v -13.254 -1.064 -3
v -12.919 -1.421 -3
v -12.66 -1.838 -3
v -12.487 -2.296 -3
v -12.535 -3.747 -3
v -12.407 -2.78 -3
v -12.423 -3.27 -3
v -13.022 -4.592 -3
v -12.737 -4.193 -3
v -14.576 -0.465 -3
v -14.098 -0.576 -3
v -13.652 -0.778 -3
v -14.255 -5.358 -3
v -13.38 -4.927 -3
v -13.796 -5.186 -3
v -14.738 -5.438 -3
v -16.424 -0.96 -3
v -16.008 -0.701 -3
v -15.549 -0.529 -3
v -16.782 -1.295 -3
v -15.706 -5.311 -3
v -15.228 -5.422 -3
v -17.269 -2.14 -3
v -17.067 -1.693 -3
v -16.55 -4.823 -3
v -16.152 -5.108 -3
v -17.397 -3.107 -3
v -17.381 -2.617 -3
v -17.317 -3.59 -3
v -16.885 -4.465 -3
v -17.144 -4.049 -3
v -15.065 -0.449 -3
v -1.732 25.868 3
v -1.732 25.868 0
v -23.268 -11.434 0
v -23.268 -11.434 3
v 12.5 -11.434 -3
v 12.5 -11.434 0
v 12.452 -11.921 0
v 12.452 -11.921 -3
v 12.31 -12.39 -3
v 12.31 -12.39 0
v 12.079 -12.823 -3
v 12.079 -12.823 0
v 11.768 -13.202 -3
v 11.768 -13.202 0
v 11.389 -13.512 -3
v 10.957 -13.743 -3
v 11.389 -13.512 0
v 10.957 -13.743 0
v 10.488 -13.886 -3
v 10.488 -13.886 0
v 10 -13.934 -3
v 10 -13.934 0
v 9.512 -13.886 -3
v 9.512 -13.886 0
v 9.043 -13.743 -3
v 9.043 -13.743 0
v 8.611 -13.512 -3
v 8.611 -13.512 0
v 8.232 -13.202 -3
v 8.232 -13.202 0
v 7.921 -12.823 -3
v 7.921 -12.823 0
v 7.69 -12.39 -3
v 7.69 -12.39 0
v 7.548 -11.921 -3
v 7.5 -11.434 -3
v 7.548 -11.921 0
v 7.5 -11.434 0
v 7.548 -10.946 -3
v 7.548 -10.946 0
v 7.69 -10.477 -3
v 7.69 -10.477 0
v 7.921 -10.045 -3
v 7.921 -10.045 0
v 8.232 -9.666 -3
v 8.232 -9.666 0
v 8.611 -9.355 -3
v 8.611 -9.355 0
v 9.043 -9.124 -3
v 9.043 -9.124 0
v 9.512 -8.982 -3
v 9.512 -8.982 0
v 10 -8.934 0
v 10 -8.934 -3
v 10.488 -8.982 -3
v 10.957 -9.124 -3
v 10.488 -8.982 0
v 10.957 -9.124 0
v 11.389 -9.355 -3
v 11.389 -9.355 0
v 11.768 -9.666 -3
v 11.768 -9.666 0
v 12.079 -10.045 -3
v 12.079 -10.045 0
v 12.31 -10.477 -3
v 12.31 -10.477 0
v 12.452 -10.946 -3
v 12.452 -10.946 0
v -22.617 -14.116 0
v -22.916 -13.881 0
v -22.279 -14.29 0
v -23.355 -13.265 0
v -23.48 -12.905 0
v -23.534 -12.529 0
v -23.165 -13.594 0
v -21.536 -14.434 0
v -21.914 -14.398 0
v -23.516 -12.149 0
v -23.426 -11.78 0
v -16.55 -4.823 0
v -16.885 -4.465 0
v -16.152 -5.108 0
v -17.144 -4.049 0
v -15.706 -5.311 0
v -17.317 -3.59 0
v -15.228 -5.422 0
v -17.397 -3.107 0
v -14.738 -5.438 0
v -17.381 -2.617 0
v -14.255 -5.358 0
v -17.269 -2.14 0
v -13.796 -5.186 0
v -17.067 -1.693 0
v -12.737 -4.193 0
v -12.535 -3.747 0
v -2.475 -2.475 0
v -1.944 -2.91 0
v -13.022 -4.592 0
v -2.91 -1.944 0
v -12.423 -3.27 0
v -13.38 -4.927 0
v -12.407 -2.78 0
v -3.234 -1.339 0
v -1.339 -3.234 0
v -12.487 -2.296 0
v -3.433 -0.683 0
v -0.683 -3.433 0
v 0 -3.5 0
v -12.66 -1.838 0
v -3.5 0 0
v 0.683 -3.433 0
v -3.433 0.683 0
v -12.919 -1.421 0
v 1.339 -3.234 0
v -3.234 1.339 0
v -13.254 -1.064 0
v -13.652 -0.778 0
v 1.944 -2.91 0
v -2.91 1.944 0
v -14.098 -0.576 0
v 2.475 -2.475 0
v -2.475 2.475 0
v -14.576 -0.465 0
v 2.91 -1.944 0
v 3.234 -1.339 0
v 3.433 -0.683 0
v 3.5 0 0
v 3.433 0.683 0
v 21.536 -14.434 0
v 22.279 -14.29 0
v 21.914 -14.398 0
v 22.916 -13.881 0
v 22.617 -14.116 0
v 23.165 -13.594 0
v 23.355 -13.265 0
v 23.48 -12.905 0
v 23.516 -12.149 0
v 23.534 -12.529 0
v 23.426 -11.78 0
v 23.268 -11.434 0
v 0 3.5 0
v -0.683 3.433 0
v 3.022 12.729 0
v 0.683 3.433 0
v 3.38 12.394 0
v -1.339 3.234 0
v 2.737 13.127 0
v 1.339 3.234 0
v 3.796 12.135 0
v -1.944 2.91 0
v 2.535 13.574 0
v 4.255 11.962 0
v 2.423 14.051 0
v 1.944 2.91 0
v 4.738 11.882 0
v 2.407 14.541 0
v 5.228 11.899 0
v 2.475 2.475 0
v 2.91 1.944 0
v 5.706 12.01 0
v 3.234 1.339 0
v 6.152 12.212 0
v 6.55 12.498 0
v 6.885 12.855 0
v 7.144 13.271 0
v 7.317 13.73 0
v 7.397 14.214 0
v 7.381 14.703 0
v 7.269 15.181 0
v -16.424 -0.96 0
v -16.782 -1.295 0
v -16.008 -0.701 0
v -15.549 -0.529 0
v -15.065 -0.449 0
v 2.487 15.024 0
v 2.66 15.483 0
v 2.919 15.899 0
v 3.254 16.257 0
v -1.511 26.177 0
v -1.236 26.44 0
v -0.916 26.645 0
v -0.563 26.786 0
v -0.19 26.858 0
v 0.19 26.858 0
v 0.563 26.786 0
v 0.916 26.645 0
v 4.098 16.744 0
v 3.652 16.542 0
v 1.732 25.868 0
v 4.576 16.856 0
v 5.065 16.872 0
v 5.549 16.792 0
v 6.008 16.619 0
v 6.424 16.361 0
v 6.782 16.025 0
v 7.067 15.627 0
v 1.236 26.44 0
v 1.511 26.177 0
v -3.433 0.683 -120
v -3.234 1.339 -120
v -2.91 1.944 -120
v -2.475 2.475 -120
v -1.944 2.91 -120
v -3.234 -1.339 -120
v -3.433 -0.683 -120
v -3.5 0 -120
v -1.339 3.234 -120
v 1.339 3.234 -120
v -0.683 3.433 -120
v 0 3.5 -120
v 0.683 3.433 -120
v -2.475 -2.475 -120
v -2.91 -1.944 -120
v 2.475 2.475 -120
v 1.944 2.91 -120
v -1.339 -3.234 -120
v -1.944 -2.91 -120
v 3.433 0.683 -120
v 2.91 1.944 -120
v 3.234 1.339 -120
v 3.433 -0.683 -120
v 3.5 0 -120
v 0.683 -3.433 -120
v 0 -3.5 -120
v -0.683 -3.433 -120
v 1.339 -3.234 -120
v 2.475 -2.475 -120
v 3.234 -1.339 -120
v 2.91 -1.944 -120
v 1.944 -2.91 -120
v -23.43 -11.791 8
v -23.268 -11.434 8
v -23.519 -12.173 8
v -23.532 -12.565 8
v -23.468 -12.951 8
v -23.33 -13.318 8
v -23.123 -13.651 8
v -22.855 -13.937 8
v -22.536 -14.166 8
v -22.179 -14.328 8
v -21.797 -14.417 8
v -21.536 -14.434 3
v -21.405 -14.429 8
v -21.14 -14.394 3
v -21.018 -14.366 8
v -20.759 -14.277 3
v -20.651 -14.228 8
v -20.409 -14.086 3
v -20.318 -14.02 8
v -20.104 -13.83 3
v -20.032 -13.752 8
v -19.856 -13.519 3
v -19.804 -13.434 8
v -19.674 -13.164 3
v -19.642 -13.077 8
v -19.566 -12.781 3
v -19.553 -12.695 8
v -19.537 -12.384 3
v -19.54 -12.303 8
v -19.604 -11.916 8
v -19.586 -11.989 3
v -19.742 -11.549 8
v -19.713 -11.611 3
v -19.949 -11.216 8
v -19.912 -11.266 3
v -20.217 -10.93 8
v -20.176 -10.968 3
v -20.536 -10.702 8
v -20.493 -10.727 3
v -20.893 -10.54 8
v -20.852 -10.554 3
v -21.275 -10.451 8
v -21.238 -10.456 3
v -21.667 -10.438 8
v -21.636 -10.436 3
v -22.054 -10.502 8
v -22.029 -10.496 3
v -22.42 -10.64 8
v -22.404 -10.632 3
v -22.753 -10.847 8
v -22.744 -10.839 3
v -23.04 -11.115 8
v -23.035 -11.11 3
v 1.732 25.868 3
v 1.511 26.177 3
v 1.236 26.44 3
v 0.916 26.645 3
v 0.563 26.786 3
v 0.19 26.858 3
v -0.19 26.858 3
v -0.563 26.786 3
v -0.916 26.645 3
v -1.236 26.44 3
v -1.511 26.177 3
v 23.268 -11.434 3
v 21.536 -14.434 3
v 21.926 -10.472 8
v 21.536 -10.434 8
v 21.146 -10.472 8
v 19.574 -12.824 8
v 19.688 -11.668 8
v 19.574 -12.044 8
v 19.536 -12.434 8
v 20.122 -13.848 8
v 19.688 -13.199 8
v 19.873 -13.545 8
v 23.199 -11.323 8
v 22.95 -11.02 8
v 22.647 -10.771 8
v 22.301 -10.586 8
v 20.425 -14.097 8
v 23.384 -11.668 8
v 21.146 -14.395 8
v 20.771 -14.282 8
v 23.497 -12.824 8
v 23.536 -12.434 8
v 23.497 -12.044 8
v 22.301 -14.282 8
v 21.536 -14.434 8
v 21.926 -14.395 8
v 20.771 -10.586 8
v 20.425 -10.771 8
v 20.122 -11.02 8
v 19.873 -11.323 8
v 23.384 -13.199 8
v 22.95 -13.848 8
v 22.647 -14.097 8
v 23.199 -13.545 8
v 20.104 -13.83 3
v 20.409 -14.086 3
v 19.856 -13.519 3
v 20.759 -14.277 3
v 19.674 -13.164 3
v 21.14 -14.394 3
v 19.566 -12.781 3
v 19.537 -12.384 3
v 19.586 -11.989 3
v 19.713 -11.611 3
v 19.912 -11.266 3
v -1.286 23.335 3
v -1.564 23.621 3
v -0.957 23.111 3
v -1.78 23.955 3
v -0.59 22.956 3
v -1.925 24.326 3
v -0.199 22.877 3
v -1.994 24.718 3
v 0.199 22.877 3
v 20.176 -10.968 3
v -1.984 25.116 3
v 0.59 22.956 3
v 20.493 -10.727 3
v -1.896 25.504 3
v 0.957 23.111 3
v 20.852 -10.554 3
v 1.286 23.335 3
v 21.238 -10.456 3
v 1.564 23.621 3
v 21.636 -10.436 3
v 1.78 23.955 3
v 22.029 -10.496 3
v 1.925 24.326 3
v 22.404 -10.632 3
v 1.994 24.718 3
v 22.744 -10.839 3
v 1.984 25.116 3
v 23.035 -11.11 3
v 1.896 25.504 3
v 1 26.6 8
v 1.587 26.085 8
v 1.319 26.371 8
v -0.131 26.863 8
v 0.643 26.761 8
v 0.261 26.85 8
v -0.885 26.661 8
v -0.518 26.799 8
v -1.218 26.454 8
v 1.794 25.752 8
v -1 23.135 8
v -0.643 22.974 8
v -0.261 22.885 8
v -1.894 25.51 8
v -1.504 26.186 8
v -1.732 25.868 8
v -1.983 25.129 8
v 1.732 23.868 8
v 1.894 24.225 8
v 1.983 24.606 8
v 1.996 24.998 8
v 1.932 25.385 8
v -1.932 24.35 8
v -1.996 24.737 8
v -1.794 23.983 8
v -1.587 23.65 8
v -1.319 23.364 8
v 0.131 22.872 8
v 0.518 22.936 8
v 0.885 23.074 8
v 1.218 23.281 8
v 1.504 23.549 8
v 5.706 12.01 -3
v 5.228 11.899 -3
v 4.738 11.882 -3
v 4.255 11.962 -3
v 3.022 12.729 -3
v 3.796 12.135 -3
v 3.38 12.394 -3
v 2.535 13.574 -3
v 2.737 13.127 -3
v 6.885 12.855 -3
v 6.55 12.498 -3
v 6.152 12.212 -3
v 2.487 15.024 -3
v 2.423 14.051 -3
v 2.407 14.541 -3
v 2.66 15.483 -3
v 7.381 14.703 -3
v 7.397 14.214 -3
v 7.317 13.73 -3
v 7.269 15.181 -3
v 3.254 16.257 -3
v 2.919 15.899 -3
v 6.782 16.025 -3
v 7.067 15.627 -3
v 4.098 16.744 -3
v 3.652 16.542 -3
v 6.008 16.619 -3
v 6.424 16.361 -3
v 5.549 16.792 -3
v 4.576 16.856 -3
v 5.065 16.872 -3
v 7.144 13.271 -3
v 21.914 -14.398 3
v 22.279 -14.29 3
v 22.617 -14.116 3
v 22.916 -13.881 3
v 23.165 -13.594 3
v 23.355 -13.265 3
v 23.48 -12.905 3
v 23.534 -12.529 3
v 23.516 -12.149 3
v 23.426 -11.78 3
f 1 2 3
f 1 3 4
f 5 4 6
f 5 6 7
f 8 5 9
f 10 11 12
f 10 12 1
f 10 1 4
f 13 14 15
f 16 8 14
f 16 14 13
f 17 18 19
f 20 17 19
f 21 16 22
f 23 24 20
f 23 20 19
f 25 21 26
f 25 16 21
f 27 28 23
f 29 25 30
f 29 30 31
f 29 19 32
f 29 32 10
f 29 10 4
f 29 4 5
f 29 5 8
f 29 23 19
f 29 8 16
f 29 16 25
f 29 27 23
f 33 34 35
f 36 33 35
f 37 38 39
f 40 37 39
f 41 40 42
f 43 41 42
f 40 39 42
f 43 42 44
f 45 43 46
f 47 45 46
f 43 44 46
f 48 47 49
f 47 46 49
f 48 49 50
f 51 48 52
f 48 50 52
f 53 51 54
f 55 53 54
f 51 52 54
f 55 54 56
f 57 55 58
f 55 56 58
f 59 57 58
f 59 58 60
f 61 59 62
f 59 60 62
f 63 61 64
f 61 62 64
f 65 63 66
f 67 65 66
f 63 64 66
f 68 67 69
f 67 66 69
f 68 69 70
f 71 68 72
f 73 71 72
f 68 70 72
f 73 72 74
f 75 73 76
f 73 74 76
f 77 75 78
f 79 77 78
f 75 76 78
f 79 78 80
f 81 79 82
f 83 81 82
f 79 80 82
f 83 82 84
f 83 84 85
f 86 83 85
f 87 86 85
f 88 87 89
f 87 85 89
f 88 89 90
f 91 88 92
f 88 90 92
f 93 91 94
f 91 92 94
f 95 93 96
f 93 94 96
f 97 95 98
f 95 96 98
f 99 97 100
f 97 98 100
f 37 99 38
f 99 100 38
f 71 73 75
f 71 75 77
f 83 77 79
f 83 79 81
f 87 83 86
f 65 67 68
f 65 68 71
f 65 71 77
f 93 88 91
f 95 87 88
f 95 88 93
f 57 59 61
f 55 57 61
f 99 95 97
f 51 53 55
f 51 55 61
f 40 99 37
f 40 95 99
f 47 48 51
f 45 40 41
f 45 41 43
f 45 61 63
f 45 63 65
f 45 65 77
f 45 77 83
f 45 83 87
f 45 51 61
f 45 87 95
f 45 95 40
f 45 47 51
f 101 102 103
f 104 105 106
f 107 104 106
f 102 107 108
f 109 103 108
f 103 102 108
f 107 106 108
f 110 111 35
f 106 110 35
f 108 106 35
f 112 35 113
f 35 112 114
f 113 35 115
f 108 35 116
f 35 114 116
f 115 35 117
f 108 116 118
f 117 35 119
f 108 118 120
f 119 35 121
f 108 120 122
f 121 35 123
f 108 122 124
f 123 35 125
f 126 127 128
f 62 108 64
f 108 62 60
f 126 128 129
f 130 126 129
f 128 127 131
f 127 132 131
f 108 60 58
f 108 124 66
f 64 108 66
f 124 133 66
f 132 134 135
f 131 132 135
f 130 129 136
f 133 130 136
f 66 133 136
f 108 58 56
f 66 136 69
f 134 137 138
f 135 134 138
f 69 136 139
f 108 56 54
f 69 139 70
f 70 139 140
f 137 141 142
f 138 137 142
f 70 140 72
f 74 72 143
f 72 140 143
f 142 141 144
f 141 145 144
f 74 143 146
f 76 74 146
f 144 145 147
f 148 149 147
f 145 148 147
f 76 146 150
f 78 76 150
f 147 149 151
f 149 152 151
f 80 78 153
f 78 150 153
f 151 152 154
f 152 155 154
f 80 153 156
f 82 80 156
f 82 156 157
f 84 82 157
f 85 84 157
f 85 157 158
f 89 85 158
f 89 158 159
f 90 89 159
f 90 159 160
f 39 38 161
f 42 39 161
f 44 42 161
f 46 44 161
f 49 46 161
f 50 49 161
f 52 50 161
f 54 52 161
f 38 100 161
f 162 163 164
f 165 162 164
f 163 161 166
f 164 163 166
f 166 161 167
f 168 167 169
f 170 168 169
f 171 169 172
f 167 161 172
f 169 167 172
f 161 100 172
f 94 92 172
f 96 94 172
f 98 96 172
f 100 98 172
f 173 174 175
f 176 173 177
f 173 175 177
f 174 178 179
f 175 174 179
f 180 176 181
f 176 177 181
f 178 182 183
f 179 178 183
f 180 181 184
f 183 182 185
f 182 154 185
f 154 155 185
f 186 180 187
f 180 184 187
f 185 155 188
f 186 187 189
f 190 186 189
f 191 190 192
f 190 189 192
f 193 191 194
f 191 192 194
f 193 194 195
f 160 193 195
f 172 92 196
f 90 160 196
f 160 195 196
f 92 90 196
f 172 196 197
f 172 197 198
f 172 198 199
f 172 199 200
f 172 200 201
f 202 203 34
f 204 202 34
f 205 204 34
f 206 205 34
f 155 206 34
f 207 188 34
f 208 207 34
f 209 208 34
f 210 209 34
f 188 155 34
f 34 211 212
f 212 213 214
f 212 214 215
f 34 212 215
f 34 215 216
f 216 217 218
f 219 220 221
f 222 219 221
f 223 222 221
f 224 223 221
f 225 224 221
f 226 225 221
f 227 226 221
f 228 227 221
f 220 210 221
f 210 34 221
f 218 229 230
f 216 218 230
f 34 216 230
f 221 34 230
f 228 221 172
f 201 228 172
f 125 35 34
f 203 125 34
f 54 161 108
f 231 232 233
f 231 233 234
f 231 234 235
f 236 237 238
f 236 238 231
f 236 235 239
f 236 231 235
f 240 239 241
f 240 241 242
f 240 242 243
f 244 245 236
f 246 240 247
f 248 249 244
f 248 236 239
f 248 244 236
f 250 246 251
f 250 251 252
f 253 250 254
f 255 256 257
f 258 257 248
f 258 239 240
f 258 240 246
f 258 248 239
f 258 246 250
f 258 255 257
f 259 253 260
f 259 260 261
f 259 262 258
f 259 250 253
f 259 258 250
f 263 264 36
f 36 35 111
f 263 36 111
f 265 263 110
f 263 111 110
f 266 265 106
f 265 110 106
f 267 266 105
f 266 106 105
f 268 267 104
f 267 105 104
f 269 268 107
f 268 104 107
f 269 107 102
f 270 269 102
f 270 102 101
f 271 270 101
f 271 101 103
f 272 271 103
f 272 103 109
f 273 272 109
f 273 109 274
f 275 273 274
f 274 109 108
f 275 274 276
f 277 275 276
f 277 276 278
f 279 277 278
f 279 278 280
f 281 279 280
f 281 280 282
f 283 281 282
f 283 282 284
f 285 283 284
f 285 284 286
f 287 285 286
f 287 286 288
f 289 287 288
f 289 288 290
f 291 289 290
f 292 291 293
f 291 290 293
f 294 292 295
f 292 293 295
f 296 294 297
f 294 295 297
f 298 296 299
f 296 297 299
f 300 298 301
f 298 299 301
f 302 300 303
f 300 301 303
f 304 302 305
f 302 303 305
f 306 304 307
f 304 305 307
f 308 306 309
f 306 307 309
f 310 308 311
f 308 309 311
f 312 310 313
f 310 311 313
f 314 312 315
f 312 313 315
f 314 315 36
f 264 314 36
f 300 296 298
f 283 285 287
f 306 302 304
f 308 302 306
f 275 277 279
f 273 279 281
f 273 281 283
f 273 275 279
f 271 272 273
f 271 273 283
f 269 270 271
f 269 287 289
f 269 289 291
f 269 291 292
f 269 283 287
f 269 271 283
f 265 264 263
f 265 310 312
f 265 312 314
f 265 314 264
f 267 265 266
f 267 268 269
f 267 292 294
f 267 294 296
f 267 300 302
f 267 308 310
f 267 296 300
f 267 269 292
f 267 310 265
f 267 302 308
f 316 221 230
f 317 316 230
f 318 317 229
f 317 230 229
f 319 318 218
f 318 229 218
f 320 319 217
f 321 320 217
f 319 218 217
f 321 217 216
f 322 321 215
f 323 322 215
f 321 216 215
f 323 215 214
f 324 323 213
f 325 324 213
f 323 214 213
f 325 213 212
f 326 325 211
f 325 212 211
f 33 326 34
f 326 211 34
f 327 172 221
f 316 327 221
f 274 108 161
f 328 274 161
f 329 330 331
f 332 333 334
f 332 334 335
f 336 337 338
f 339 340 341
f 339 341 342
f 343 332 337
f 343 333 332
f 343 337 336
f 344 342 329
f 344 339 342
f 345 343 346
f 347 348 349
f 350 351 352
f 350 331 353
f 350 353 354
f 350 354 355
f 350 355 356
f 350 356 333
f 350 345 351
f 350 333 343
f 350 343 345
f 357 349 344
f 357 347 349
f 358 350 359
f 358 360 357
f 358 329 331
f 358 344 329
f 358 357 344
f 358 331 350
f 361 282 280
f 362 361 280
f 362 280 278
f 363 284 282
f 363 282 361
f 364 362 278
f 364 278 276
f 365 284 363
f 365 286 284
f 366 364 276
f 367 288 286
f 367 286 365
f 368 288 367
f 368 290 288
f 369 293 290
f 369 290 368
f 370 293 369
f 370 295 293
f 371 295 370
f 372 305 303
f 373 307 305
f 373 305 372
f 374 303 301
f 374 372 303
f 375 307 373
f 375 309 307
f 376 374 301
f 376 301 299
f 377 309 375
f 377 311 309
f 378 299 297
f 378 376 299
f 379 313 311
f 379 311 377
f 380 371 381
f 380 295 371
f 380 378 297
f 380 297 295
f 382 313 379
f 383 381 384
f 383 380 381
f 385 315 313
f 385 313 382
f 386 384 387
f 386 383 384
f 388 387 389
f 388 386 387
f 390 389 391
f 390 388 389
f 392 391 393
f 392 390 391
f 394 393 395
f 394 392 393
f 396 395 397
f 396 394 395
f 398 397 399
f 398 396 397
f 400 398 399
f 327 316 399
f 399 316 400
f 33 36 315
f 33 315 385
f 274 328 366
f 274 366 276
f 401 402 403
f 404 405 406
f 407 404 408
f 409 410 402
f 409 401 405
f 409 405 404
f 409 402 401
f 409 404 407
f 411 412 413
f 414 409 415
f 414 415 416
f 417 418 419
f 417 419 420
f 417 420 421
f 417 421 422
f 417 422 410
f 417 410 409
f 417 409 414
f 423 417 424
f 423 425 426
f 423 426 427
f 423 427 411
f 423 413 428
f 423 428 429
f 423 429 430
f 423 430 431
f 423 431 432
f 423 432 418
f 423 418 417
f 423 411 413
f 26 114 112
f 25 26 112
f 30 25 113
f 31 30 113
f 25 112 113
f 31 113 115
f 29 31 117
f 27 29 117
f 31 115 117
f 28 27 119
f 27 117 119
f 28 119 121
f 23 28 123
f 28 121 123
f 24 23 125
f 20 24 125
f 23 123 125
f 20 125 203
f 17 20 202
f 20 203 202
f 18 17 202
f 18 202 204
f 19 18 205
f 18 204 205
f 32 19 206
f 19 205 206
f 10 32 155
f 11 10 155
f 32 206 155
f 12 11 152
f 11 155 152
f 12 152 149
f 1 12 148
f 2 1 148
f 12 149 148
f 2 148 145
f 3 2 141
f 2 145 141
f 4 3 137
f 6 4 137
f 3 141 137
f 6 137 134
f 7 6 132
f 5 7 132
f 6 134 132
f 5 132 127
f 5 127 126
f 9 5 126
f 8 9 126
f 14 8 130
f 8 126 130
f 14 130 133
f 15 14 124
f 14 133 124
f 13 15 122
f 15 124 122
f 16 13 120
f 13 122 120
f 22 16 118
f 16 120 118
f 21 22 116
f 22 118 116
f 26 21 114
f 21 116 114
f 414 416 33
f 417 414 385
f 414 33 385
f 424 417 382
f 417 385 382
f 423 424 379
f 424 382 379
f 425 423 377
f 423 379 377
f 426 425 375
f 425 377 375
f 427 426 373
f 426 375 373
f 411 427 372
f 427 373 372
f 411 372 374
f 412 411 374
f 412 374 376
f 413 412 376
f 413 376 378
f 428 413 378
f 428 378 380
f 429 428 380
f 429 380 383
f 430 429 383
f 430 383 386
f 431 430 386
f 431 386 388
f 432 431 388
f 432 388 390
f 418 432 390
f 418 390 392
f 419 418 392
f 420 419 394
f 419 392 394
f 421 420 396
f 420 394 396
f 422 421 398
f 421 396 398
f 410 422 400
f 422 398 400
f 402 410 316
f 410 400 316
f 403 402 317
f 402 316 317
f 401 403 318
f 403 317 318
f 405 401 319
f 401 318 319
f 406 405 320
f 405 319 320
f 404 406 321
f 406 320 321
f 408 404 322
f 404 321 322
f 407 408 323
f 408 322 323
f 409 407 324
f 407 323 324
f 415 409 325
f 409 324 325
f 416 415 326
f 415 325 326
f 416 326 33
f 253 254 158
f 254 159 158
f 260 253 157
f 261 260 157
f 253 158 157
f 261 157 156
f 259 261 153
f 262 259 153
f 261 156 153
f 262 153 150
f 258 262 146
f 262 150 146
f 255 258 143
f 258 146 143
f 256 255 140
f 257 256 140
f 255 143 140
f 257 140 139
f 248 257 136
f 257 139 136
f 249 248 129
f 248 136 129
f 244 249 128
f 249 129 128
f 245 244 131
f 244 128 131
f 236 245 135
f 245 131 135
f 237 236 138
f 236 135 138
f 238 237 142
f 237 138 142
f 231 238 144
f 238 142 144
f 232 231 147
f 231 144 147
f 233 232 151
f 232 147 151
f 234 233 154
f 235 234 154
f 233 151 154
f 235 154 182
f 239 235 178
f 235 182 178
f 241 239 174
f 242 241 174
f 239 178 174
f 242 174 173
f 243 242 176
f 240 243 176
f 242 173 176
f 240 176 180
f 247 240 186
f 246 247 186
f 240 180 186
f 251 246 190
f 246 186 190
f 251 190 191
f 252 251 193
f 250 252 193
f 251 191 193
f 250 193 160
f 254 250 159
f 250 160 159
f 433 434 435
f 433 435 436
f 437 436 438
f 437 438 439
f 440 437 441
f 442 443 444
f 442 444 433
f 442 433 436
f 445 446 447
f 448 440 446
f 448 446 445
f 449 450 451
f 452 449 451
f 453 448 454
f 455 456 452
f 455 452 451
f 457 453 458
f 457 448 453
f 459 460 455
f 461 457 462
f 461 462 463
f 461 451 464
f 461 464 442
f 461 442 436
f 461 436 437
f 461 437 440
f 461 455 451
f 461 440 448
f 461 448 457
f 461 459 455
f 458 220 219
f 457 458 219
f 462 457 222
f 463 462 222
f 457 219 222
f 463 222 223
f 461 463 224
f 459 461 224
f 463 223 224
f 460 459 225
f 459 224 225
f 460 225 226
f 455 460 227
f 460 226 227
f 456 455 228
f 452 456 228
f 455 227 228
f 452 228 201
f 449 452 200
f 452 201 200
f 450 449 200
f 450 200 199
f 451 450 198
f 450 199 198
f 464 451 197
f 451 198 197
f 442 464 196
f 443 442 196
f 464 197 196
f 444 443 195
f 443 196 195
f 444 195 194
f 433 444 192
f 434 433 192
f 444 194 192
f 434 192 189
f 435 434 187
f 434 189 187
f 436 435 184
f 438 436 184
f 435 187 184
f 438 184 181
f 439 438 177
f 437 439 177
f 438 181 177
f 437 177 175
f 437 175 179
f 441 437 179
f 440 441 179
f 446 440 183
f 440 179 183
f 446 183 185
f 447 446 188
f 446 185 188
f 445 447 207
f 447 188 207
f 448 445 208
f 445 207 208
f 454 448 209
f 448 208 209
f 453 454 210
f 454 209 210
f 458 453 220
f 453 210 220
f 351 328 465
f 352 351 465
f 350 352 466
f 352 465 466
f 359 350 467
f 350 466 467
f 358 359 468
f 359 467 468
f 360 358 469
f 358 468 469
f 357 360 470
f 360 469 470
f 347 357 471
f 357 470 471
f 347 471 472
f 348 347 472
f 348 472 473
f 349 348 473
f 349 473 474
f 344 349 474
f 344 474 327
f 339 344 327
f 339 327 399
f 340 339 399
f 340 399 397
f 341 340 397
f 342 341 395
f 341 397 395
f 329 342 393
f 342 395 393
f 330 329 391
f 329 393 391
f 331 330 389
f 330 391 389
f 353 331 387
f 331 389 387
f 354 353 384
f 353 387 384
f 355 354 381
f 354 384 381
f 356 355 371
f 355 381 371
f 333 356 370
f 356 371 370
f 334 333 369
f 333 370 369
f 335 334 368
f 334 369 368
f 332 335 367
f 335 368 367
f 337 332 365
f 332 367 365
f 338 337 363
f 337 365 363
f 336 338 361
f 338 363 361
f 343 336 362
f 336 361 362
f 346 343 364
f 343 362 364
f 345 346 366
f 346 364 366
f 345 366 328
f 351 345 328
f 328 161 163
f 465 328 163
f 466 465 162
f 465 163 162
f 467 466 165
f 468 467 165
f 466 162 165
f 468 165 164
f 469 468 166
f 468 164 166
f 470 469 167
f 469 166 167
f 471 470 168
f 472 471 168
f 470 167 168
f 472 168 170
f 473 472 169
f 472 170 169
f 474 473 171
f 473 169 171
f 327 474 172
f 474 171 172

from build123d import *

# Parameters (mm, degrees)
BOSS_EXTRUDE1_DEPTH = 3
SKETCH2_R           = 3.5
BOSS_EXTRUDE2_DEPTH = 10
SKETCH3_R           = 2
BOSS_EXTRUDE3_DEPTH = 5
SKETCH4_R           = 2.5
BOSS_EXTRUDE4_DEPTH = 3
CIRPATTERN1_COUNT   = 3
SKETCH5_R           = 3.5
BOSS_EXTRUDE6_DEPTH = 110


with BuildPart() as part:
    # Sketch1 → Boss-Extrude1 (new body)
    with BuildSketch(Plane.XY):
        with BuildLine():
            Line((23.267949192, -11.43375673), (1.732050808, 25.867513459))
            ThreePointArc((1.732050808, 25.867513459), (0, 26.867513459), (-1.732050808, 25.867513459))
            Line((-1.732050808, 25.867513459), (-23.267949192, -11.43375673))
            ThreePointArc((-23.267949192, -11.43375673), (-23.267949192, -13.43375673), (-21.535898385, -14.43375673))
            Line((-21.535898385, -14.43375673), (21.535898385, -14.43375673))
            ThreePointArc((21.535898385, -14.43375673), (23.267949192, -13.43375673), (23.267949192, -11.43375673))
        make_face()
    extrude(amount=BOSS_EXTRUDE1_DEPTH)

    # Sketch2 → Boss-Extrude2 (add)
    with BuildSketch(Plane(origin=(0, 0, 0), x_dir=(-1, 0, 0), z_dir=(0, 0, -1))):
        with Locations(Location((0, 0, 0), (0, 0, 180))):
            Circle(SKETCH2_R)
    extrude(amount=BOSS_EXTRUDE2_DEPTH)

    # Sketch3 → Boss-Extrude3 (add)
    with BuildSketch(Plane.XY.offset(3)):
        with Locations(Location((0, 24.867513459, 0), (0, 0, 150))):
            Circle(SKETCH3_R)
        with Locations(Location((21.535898385, -12.43375673, 0), (0, 0, 270))):
            Circle(SKETCH3_R)
        with Locations(Location((-21.535898385, -12.43375673, 0), (0, 0, 150))):
            Circle(SKETCH3_R)
    extrude(amount=BOSS_EXTRUDE3_DEPTH)

    # Sketch4 → Boss-Extrude4 (add)
    with BuildSketch(Plane(origin=(0, 0, 0), x_dir=(-1, 0, 0), z_dir=(0, 0, -1))):
        with Locations(Location((-10, -11.43375673, 0), (0, 0, 180))):
            Circle(SKETCH4_R)
    boss_extrude4 = extrude(amount=BOSS_EXTRUDE4_DEPTH)

    # CirPattern1: Boss-Extrude4 ×3 about axis
    cirpattern1_axis = Axis((0, 0, 0), (0, 0, 1))
    for i in range(1, CIRPATTERN1_COUNT):
        add(boss_extrude4.rotate(cirpattern1_axis, i * 360 / CIRPATTERN1_COUNT))

    # Sketch5 → Boss-Extrude6 (add)
    with BuildSketch(Plane(origin=(0, 0, -10), x_dir=(-1, 0, 0), z_dir=(0, 0, -1))):
        with Locations(Location((0, 0, 0), (0, 0, 180))):
            Circle(SKETCH5_R)
    extrude(amount=BOSS_EXTRUDE6_DEPTH)


solid = part.part
